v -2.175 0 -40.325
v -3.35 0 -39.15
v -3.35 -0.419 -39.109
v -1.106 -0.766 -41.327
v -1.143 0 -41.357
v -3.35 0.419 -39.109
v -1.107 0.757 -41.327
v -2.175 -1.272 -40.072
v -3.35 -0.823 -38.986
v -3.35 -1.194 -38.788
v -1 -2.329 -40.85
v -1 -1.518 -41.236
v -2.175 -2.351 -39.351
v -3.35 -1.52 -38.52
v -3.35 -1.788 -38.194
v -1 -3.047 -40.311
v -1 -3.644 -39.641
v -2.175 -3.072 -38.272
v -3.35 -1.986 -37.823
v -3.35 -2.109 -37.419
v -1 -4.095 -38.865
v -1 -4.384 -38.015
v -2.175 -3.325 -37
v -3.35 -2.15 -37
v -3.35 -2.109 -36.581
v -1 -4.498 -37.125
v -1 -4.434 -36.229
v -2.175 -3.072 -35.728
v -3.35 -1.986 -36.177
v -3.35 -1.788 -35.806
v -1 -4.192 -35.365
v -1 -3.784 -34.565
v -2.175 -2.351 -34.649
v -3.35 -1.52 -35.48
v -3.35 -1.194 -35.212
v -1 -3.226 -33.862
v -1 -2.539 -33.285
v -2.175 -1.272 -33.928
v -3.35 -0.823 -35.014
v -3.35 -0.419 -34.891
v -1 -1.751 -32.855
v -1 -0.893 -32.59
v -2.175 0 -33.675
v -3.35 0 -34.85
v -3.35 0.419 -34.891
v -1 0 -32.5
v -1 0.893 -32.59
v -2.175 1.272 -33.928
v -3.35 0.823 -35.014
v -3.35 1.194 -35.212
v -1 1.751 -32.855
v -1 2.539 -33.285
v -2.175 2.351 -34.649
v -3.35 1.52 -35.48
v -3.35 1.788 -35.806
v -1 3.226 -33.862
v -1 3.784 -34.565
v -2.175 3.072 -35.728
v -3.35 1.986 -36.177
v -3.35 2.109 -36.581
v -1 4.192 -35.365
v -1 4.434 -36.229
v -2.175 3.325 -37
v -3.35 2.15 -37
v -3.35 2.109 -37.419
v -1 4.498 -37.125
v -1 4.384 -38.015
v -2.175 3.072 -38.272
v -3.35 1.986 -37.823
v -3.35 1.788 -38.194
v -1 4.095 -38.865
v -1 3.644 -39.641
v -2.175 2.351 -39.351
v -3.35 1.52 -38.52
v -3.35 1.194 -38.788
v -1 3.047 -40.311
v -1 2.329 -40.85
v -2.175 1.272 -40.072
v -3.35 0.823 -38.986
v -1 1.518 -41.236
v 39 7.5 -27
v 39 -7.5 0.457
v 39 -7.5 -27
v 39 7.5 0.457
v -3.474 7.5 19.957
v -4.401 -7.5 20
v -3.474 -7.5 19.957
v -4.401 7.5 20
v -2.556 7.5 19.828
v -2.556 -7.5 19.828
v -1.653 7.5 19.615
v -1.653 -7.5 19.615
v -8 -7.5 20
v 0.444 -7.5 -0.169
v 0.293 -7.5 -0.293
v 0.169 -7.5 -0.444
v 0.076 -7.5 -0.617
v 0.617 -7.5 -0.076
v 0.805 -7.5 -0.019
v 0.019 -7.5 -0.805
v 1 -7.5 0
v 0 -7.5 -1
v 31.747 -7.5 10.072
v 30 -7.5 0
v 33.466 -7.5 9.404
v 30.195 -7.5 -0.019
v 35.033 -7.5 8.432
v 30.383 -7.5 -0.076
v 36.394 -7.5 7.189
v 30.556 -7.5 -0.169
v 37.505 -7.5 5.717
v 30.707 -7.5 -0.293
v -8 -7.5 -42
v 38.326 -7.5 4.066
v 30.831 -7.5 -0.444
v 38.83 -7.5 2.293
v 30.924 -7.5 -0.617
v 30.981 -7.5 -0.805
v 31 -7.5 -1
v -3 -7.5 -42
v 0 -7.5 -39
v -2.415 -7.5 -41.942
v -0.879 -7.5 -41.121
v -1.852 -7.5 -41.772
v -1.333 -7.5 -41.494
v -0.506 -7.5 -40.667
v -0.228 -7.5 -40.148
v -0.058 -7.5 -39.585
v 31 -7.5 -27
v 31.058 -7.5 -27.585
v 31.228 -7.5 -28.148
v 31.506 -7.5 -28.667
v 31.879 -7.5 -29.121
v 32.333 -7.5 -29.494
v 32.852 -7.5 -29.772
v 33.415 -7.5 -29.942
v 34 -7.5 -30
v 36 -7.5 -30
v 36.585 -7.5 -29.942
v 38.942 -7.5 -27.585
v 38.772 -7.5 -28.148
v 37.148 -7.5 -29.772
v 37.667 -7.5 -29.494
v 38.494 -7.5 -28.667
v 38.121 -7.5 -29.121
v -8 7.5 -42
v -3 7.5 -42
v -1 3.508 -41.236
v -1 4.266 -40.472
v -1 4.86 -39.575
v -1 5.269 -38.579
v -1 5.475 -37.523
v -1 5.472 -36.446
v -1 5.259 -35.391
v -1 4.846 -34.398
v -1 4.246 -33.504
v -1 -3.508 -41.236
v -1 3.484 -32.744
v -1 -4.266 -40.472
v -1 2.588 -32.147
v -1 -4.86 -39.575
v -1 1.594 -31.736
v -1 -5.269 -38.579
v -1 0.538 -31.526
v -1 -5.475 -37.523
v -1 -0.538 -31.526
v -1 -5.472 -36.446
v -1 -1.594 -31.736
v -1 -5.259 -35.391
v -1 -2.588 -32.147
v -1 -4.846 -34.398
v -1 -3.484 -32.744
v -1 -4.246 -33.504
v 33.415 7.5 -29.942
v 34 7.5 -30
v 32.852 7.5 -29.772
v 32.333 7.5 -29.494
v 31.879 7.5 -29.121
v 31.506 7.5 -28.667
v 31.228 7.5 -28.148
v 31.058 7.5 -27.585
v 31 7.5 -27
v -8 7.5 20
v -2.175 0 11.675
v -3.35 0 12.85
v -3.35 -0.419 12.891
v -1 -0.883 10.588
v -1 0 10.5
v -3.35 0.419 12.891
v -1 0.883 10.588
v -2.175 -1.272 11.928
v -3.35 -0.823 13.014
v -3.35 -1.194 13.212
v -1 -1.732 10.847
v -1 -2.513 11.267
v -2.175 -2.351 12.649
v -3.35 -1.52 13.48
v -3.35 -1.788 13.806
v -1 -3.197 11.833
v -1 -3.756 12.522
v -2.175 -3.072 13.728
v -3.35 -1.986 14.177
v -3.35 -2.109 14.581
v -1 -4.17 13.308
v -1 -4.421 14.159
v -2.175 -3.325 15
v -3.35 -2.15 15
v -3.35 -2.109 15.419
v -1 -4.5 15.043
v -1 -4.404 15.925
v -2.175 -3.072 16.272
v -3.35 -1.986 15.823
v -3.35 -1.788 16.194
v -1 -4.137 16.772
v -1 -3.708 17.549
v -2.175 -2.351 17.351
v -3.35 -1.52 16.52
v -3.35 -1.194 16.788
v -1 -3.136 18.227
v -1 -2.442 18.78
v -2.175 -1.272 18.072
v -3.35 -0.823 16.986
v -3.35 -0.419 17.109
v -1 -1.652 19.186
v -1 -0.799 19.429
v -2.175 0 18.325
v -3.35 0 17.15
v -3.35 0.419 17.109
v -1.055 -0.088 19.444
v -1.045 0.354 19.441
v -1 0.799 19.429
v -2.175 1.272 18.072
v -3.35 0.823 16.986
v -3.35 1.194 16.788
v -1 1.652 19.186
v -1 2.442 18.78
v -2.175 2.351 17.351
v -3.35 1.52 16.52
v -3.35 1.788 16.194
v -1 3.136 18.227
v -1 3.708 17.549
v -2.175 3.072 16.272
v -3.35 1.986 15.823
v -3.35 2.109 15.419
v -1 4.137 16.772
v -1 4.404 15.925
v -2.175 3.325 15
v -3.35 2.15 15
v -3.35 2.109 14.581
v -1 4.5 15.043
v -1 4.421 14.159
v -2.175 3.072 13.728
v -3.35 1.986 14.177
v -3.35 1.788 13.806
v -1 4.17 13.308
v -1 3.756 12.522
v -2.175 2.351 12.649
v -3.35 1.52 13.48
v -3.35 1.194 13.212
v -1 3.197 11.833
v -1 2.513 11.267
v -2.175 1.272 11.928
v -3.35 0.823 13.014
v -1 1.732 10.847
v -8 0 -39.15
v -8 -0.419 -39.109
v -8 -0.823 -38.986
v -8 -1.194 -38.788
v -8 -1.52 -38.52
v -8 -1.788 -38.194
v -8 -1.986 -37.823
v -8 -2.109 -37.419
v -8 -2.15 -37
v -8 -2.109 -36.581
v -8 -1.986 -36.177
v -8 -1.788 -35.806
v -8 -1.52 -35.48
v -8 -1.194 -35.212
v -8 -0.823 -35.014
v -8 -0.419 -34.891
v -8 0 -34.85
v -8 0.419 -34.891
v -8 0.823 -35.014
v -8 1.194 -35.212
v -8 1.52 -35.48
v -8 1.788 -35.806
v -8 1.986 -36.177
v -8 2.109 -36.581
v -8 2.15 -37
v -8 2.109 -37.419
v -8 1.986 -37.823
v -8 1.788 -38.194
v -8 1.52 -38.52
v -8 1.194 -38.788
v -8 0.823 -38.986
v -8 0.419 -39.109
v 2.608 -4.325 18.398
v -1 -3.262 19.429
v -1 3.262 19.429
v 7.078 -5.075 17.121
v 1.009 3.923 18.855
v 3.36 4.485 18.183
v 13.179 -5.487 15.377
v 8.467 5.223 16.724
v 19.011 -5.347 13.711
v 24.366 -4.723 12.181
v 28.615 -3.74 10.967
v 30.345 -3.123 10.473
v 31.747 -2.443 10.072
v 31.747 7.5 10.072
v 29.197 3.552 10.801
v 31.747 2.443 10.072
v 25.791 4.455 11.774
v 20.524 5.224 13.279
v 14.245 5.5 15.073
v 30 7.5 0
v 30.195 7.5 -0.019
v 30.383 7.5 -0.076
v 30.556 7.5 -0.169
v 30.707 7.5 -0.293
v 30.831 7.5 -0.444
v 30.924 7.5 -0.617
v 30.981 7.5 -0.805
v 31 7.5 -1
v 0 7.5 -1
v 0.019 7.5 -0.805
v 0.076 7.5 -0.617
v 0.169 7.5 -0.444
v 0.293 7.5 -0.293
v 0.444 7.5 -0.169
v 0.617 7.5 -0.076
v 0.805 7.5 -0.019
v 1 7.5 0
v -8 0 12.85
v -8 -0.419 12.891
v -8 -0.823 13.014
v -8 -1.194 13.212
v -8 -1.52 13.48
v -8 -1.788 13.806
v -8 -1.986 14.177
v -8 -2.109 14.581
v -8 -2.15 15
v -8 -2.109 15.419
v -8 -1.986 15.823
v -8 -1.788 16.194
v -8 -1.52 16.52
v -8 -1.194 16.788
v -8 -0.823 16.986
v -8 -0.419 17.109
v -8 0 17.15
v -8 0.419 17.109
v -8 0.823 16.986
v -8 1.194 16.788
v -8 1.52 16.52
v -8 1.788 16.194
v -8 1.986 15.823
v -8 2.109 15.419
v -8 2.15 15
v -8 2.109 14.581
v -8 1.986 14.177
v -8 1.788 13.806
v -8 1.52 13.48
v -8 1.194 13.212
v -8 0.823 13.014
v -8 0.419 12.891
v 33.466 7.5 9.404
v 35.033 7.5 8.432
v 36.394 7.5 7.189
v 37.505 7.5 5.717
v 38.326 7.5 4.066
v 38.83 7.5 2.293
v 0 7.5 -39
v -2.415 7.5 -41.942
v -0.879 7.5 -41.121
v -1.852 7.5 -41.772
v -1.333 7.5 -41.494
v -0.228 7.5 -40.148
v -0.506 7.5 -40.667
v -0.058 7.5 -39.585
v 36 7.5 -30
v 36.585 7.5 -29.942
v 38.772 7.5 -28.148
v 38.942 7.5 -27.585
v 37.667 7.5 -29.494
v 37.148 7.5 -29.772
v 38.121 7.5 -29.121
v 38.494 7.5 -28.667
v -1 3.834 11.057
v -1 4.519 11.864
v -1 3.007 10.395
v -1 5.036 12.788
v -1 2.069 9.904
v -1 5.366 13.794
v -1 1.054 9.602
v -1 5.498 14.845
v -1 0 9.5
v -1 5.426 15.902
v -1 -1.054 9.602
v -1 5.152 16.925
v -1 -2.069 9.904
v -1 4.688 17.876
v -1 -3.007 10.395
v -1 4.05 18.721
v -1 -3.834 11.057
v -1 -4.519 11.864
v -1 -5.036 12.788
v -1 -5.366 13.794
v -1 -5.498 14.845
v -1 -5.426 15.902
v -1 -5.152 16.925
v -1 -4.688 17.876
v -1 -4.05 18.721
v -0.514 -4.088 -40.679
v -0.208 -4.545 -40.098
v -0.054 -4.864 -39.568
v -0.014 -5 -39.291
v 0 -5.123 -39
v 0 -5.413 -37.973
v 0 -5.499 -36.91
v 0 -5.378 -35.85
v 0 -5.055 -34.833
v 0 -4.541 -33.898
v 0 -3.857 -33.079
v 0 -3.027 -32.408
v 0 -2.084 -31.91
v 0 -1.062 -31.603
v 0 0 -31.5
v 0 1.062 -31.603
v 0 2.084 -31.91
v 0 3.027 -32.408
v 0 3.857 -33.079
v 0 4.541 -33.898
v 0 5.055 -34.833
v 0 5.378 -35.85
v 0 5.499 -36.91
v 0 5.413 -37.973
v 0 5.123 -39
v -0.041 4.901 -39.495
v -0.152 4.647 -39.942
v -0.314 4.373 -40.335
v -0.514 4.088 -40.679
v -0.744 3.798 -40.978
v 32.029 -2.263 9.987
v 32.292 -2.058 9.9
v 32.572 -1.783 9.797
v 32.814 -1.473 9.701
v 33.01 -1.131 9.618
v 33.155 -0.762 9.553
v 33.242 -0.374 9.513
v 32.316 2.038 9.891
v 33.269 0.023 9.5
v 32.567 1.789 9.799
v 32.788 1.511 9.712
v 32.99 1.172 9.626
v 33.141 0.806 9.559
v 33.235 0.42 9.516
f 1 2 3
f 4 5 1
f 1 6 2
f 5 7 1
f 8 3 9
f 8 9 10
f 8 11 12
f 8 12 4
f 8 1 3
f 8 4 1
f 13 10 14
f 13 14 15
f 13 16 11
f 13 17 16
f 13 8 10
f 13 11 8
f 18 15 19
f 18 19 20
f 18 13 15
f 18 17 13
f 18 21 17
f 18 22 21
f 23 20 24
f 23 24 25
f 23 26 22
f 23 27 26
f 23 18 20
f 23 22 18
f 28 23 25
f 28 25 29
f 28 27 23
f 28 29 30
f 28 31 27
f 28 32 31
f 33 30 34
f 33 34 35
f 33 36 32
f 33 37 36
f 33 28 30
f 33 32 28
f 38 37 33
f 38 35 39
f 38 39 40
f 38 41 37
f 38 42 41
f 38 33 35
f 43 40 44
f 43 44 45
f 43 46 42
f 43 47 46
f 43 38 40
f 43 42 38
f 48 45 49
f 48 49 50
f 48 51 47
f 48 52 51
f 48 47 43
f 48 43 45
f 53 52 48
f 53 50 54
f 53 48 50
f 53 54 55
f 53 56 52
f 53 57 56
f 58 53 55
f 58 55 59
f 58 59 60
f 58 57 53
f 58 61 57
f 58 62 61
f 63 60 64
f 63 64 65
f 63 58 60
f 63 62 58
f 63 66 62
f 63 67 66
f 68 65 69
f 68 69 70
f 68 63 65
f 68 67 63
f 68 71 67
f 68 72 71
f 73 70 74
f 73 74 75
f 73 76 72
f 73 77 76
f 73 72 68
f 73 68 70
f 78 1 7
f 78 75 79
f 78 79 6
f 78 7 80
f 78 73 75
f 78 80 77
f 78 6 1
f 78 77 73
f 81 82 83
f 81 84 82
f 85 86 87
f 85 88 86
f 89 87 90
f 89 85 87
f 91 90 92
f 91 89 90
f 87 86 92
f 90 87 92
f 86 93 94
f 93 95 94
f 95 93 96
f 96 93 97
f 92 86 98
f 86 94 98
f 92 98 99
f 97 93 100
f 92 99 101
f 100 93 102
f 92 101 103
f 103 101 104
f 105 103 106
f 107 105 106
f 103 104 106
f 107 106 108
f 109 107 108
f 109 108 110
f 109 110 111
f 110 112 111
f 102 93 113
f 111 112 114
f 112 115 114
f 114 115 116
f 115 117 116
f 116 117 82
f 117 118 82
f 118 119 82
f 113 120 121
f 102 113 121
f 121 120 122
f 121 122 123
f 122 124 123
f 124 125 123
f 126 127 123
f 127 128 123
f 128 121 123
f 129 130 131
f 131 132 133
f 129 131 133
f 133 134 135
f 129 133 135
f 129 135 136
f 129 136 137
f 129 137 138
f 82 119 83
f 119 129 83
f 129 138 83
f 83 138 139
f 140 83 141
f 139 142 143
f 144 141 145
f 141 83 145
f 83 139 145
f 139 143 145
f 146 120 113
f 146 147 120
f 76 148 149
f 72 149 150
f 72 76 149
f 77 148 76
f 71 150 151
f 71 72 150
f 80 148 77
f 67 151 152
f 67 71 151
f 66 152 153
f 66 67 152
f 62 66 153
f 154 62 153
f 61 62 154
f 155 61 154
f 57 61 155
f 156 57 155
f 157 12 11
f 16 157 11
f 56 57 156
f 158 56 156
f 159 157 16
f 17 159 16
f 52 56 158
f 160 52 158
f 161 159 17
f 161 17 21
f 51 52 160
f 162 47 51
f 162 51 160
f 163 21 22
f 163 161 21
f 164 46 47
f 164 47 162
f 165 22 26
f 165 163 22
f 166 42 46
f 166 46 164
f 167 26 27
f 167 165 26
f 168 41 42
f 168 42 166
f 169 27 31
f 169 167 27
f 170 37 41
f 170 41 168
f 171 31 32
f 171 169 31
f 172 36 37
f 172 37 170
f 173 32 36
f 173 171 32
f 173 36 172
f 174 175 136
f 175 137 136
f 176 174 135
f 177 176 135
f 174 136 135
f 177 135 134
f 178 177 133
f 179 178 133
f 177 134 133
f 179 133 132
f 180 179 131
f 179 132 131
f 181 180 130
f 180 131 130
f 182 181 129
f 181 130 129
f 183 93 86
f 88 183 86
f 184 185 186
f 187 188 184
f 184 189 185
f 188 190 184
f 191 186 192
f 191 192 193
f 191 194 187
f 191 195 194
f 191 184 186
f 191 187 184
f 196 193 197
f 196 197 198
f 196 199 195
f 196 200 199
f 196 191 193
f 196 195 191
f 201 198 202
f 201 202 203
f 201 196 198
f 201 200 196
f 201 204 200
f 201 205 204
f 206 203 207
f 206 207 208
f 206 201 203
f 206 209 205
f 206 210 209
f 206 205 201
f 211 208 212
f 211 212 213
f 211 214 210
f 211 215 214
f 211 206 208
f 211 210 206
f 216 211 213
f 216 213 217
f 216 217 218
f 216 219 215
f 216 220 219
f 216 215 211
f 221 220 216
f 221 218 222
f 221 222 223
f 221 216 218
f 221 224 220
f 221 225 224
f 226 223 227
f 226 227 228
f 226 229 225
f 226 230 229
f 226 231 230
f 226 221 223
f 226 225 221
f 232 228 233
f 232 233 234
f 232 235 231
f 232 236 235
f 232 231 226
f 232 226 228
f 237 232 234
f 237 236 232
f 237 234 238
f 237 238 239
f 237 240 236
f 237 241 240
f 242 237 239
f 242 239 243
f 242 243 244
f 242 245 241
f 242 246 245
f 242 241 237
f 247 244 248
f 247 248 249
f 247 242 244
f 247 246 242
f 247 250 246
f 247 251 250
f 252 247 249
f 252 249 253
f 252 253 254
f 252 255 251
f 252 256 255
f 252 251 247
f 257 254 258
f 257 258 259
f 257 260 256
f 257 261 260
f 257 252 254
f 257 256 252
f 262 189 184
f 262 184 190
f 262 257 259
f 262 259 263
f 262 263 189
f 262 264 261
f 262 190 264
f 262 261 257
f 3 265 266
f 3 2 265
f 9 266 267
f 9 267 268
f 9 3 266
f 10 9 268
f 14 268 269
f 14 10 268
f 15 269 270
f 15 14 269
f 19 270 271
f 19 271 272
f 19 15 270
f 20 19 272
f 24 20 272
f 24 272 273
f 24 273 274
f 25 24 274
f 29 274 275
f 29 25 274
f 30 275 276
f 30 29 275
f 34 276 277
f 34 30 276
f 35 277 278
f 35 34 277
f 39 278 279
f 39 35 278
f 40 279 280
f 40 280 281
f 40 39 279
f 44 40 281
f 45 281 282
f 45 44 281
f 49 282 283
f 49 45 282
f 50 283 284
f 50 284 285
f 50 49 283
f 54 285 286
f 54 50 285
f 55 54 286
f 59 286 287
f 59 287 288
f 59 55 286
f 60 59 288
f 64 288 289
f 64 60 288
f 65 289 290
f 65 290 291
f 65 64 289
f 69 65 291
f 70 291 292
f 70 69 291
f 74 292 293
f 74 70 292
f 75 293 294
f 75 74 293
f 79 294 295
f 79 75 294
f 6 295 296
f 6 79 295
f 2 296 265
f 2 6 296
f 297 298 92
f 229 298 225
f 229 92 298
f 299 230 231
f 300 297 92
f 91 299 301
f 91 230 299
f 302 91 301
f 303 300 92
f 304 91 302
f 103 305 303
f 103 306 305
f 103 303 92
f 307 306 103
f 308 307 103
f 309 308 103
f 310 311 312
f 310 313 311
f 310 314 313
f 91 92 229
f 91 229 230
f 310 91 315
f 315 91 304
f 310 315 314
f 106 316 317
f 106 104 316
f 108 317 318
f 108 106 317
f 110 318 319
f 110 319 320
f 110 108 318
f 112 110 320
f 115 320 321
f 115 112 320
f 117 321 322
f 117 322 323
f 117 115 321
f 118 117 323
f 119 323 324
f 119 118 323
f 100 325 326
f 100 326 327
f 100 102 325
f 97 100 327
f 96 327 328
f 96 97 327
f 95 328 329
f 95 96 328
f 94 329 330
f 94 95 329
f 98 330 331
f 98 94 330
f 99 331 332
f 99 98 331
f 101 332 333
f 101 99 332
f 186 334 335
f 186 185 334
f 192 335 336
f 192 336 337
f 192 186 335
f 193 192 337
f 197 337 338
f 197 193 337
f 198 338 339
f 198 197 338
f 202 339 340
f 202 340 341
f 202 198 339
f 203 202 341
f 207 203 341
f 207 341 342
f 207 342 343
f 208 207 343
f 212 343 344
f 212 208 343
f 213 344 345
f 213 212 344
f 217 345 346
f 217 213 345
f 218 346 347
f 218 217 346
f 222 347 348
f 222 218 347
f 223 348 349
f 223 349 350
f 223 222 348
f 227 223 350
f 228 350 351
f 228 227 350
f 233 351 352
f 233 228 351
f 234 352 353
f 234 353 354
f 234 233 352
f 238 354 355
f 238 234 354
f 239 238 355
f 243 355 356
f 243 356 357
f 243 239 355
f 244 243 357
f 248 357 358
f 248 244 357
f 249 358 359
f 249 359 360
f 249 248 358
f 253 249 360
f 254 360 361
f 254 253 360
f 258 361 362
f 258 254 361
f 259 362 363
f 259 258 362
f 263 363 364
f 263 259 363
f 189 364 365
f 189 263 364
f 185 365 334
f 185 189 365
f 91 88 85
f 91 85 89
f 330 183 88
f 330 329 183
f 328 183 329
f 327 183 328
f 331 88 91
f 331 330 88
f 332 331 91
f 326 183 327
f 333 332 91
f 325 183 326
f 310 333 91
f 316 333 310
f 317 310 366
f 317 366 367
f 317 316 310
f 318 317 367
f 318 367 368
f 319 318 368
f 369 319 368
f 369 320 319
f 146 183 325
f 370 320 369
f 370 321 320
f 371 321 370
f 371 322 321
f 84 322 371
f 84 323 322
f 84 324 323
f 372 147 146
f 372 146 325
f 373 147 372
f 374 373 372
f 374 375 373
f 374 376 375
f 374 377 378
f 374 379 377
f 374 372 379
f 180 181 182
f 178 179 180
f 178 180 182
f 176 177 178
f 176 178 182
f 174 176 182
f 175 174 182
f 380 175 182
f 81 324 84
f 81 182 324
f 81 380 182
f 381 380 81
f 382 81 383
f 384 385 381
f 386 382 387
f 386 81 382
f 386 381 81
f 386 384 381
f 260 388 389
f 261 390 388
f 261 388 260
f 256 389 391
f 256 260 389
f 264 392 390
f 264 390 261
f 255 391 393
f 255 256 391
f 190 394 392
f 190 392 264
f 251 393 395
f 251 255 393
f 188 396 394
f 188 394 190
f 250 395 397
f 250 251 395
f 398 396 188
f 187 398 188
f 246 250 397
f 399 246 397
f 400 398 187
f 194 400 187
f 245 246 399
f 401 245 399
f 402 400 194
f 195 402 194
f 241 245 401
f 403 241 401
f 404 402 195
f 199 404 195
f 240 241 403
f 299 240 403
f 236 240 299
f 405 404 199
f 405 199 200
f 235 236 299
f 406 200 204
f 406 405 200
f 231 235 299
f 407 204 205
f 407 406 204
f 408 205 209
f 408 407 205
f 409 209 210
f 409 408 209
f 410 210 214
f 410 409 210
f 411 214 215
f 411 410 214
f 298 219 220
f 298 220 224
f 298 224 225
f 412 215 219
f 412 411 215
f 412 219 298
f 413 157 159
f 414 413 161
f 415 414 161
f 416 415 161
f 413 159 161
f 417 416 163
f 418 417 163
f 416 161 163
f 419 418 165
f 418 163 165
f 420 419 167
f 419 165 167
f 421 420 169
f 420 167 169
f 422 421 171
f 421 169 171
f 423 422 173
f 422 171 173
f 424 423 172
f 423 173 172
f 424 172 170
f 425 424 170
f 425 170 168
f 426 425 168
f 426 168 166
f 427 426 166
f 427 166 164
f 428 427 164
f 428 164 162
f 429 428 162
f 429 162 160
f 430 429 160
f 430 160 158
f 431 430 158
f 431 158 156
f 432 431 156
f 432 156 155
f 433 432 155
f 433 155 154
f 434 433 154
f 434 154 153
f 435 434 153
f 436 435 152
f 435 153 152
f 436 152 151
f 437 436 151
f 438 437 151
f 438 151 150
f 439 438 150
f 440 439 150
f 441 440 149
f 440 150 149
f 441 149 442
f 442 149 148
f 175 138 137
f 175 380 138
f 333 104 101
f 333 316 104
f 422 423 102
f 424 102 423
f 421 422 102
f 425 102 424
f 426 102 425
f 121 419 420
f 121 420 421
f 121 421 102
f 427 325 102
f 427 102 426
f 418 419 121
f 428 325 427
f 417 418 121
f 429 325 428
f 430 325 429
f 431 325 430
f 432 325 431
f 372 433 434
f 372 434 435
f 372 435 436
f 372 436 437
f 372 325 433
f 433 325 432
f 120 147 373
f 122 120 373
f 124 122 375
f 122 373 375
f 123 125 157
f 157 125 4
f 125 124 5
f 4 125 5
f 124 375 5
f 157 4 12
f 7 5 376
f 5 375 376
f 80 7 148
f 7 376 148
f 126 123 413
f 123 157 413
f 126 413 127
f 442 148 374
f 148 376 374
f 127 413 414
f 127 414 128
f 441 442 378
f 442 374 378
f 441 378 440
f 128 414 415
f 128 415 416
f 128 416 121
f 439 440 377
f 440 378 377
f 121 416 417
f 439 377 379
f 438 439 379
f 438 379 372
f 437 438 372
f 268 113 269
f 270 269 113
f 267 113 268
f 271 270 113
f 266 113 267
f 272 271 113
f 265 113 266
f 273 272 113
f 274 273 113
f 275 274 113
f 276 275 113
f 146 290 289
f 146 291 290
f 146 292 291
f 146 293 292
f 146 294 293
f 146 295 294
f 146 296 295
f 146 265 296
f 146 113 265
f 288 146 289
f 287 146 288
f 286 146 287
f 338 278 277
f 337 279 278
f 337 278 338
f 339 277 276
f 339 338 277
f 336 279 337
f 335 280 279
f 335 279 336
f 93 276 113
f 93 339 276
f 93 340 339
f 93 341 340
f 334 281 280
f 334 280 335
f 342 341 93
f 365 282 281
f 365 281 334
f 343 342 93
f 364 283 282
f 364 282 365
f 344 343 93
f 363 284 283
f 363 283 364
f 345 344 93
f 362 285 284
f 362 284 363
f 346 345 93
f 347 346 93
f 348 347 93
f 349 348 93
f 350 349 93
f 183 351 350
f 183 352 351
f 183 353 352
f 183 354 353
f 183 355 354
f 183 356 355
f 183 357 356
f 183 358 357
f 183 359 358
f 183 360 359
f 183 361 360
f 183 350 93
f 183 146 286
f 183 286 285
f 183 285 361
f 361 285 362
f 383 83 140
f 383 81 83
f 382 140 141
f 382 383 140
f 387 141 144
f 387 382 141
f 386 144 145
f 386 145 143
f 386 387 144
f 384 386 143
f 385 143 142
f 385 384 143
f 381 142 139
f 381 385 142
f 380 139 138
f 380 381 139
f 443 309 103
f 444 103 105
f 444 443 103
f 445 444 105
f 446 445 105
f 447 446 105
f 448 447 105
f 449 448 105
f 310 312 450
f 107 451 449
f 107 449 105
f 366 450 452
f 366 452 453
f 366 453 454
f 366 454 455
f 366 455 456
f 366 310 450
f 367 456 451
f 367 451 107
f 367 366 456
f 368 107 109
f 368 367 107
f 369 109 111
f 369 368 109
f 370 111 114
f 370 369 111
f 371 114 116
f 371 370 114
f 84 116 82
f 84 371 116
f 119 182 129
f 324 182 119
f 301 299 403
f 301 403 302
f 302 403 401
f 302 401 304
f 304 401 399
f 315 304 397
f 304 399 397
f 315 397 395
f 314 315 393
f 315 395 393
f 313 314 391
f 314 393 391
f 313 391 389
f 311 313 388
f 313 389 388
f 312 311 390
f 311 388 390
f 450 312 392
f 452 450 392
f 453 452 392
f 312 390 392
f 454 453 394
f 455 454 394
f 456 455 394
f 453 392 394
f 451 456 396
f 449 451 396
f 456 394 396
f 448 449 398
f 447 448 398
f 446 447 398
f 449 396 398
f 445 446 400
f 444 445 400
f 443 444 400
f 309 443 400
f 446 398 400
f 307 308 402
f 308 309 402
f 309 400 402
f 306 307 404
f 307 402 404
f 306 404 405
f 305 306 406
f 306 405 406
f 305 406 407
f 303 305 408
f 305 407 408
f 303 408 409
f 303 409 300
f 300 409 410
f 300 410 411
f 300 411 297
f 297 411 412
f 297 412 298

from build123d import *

# Parameters (mm, degrees)
BOSS_EXTRU_1_DEPTH                           = 7.5
CONG_1_R                                     = 1
CONG_2_R                                     = 10
CONG_3_R                                     = 3
CHAMBRAGE_POUR_VIS_T_TE_CYLINDRIQUE_AT_COUNT = 2
CHAMBRAGE_POUR_VIS_T_TE_CYLINDRIQUE_AT_PITCH = 52


with BuildPart() as part:
    # Esquisse1 → Boss.-Extru.1 (new, symmetric)
    with BuildSketch(Plane(origin=(0, 0, 0), x_dir=(1, 0, 0), z_dir=(0, 1, 0))):
        Polygon((0, 0), (0, 42), (-8, 42), (-8, -20), (-3, -20), (39, -8), (39, 30), (31, 30), (31, 0), align=None)
    extrude(amount=BOSS_EXTRU_1_DEPTH, both=True)

    # Congé1
    cong_1_edges = [part.edges().sort_by_distance(p)[0] for p in [
        (31, 0, 0),
        (0, 0, 0),
    ]]
    fillet(cong_1_edges, radius=CONG_1_R)

    # Congé2
    cong_2_edges = [part.edges().sort_by_distance(p)[0] for p in [
        (39, 0, 8),
        (-3, 0, 20),
    ]]
    fillet(cong_2_edges, radius=CONG_2_R)

    # Congé3
    cong_3_edges = [part.edges().sort_by_distance(p)[0] for p in [
        (31, 0, -30),
        (39, 0, -30),
        (0, 0, -42),
    ]]
    fillet(cong_3_edges, radius=CONG_3_R)

    # Esquisse2 → Chambrage pour vis à tête cylindrique à 6 pans creux (ou vis CHC) M41 (revolve, cut)
    with BuildSketch(Plane(origin=(0, 0, -37), x_dir=(0, 0, -1), z_dir=(0, 1, 0))):
        Polygon((0, 0), (0, 8), (2.15, 8), (2.15, 3.35), (4.5, 1), (5.5, 1), (5.5, 0), (5.5, -39), (0, -39), align=None)
    chambrage_pour_vis_t_te_cylindrique = revolve(axis=Axis((6.35, 0, -37), (-1, 0, 0)), mode=Mode.SUBTRACT)

    # Chambrage pour vis à tête cylindrique à 6 pans creux (ou vis CHC) M41 at: Chambrage pour vis à tête cylindrique à 6 pans creux (ou vis CHC) M41 ×2
    with Locations(*[(0, 0, i * CHAMBRAGE_POUR_VIS_T_TE_CYLINDRIQUE_AT_PITCH) for i in range(1, CHAMBRAGE_POUR_VIS_T_TE_CYLINDRIQUE_AT_COUNT)]):
        add(chambrage_pour_vis_t_te_cylindrique, mode=Mode.SUBTRACT)


solid = part.part
